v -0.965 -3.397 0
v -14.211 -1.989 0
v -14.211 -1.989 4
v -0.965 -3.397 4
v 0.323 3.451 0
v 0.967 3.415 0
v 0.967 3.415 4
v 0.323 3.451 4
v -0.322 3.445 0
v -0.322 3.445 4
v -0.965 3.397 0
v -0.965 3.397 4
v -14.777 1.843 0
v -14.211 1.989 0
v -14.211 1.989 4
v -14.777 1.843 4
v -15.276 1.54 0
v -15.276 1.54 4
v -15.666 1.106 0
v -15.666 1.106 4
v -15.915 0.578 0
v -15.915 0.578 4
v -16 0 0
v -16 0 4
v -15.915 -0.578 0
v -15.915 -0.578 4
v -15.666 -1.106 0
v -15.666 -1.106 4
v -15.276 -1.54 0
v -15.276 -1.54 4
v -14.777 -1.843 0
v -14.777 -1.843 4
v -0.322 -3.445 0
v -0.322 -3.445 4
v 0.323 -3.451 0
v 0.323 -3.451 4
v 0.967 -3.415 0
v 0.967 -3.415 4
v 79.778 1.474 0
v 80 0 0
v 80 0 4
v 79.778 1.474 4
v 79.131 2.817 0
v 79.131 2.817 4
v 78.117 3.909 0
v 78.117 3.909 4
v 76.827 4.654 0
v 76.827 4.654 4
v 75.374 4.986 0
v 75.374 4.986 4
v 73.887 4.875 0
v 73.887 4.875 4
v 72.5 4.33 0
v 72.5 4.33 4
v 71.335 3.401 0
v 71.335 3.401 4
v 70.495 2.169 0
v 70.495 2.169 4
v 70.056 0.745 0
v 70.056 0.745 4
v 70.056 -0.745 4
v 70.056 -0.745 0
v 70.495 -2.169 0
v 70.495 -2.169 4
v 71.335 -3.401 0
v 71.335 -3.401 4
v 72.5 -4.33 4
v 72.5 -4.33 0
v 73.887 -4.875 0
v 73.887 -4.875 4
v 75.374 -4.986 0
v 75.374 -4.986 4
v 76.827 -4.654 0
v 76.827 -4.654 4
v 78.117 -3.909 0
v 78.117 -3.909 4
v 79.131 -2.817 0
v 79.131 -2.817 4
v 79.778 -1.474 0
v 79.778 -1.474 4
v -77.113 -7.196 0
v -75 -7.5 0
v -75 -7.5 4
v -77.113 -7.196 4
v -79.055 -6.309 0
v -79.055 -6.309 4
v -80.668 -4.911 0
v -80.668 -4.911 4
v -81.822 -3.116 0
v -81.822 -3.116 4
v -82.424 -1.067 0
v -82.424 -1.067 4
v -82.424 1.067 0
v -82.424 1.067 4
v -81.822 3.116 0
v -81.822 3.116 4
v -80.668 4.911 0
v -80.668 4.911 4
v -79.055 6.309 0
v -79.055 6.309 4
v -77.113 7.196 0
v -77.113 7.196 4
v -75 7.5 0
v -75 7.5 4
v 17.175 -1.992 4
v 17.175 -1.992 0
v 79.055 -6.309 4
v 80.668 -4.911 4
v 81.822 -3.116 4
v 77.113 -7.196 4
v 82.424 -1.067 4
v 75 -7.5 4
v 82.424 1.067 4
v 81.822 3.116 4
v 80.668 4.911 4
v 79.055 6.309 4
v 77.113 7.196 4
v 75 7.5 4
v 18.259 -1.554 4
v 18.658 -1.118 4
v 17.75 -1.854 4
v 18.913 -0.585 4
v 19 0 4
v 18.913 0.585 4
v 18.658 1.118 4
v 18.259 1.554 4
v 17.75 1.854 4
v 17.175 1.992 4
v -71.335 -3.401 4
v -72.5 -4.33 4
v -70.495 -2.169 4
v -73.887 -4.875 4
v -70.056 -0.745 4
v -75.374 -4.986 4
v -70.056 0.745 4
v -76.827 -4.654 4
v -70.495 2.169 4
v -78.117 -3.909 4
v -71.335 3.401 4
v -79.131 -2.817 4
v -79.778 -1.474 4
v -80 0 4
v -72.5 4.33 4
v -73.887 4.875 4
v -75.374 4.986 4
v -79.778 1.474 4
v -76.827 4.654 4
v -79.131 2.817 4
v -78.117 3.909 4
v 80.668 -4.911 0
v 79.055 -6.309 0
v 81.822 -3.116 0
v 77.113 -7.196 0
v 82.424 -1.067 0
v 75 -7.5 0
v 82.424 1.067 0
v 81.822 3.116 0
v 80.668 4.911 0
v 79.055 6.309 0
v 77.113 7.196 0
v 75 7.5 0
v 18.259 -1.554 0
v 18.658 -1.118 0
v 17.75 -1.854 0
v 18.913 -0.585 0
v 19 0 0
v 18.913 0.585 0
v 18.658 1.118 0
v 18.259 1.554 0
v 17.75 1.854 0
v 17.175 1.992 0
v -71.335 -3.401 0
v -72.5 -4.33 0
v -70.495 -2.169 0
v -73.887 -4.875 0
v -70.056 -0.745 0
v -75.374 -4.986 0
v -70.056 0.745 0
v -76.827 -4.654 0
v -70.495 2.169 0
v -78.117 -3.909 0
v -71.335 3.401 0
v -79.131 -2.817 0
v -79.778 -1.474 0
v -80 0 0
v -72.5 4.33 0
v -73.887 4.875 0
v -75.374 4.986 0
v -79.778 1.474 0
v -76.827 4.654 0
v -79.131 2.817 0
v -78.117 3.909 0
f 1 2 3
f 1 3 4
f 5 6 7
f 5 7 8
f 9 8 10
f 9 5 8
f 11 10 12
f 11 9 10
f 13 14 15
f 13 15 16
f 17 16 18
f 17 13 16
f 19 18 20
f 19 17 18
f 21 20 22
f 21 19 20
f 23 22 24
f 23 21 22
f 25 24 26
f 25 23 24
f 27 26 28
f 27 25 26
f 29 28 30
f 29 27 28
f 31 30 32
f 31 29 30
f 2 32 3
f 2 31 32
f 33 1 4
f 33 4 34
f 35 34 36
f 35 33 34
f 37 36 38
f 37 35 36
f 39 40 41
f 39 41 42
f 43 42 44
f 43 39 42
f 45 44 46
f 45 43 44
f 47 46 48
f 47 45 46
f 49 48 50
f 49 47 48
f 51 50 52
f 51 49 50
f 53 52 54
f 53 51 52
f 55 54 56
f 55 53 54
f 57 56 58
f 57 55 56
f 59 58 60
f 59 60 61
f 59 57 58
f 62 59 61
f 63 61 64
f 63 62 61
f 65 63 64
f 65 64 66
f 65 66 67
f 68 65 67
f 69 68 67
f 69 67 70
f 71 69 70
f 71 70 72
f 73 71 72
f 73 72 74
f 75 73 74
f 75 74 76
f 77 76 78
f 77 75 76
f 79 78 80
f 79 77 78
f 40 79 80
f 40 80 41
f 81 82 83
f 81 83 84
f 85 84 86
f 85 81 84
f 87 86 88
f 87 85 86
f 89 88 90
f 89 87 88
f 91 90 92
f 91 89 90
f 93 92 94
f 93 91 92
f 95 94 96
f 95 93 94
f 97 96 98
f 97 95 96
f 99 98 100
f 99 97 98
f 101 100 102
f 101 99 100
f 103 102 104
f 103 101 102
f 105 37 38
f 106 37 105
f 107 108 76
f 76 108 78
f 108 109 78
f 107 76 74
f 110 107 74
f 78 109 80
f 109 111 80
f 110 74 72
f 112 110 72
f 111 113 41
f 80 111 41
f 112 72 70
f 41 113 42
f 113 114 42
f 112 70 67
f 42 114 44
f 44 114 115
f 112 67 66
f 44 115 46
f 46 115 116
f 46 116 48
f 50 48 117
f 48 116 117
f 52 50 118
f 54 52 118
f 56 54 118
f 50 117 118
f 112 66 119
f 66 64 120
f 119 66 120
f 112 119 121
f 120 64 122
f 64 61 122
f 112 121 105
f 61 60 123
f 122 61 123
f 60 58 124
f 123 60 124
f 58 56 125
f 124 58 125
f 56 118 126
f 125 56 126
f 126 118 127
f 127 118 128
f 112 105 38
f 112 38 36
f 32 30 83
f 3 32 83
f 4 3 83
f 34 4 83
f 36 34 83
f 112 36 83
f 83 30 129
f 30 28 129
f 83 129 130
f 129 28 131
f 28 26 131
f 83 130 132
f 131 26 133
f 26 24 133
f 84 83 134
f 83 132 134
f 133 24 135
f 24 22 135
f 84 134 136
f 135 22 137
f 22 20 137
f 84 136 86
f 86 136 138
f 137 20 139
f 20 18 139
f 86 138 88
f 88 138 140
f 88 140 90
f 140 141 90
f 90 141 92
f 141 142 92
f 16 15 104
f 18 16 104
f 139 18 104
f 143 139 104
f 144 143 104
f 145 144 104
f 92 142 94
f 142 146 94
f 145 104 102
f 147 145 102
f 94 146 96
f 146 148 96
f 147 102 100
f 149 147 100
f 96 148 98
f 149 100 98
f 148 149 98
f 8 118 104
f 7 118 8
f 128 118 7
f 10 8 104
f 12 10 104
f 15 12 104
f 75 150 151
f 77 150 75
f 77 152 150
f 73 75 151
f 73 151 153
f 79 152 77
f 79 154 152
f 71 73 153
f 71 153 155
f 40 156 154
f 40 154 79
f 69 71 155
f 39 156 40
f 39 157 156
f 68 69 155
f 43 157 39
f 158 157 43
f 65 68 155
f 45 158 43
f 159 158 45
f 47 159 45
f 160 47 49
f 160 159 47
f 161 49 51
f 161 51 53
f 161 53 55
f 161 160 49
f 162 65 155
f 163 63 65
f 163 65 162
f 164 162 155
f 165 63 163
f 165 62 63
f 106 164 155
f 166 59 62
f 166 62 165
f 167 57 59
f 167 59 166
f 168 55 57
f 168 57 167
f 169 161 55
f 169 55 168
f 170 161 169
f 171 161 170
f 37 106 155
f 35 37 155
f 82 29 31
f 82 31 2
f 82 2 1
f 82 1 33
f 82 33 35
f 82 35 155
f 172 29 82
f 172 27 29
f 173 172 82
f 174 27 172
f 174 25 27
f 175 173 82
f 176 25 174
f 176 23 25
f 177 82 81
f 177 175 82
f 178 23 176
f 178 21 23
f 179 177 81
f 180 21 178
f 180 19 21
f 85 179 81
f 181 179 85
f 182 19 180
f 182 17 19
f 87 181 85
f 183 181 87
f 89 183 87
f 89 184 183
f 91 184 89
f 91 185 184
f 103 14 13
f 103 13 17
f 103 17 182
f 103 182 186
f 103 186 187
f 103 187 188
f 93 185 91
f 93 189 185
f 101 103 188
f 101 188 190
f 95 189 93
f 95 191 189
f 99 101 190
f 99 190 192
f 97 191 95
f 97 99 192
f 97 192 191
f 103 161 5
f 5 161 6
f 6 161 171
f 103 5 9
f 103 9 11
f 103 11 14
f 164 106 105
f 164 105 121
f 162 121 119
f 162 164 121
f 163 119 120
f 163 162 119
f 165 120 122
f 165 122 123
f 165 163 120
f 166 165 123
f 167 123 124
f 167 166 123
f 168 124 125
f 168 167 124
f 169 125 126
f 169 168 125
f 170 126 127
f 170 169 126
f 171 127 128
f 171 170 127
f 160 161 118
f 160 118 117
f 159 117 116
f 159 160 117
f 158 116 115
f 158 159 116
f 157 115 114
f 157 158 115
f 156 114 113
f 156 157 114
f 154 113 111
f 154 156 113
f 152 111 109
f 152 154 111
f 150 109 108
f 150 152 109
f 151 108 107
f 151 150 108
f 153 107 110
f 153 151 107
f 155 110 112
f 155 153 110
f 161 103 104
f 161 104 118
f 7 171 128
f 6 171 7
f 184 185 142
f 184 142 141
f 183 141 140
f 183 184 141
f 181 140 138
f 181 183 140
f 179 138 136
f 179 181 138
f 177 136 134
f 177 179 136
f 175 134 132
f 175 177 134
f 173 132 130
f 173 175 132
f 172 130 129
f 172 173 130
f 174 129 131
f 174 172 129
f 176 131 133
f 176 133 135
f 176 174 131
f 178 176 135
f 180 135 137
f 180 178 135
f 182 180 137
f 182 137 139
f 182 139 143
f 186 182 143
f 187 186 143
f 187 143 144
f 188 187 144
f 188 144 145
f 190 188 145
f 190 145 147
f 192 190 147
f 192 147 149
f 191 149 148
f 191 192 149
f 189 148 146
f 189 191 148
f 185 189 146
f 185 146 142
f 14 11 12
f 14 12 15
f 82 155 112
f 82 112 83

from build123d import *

# Parameters (mm, degrees)
SKETCH1_R           = 5
BOSS_EXTRUDE1_DEPTH = 4


with BuildPart() as part:
    # Sketch1 → Boss-Extrude1 (new body)
    with BuildSketch(Plane.XY):
        with BuildLine():
            Line((75, -7.5), (-75, -7.5))
            ThreePointArc((-75, -7.5), (-82.5, 0), (-75, 7.5))
            Line((-75, 7.5), (75, 7.5))
            ThreePointArc((75, 7.5), (82.5, 0), (75, -7.5))
        make_face()
        with Locations((75, 0)):
            Circle(SKETCH1_R, mode=Mode.SUBTRACT)
        with Locations(Location((-75, 0, 0), (0, 0, 180))):
            Circle(SKETCH1_R, mode=Mode.SUBTRACT)
        with BuildLine():
            Line((-0.965077795, 3.3973761), (-14.211482552, 1.988787352))
            ThreePointArc((-14.211482552, 1.988787352), (-16, 0), (-14.211482552, -1.988787352))
            Line((-14.211482552, -1.988787352), (-0.965077795, -3.3973761))
            ThreePointArc((-0.965077795, -3.3973761), (0.000431807, -3.453017023), (0.966800983, -3.415131426))
            Line((0.966800983, -3.415131426), (17.174893203, -1.992338417))
            ThreePointArc((17.174893203, -1.992338417), (19, 0), (17.174893203, 1.992338417))
            Line((17.174893203, 1.992338417), (0.966800983, 3.415131426))
            ThreePointArc((0.966800983, 3.415131426), (0.000431807, 3.453017023), (-0.965077795, 3.3973761))
        make_face(mode=Mode.SUBTRACT)
    extrude(amount=BOSS_EXTRUDE1_DEPTH)


solid = part.part
